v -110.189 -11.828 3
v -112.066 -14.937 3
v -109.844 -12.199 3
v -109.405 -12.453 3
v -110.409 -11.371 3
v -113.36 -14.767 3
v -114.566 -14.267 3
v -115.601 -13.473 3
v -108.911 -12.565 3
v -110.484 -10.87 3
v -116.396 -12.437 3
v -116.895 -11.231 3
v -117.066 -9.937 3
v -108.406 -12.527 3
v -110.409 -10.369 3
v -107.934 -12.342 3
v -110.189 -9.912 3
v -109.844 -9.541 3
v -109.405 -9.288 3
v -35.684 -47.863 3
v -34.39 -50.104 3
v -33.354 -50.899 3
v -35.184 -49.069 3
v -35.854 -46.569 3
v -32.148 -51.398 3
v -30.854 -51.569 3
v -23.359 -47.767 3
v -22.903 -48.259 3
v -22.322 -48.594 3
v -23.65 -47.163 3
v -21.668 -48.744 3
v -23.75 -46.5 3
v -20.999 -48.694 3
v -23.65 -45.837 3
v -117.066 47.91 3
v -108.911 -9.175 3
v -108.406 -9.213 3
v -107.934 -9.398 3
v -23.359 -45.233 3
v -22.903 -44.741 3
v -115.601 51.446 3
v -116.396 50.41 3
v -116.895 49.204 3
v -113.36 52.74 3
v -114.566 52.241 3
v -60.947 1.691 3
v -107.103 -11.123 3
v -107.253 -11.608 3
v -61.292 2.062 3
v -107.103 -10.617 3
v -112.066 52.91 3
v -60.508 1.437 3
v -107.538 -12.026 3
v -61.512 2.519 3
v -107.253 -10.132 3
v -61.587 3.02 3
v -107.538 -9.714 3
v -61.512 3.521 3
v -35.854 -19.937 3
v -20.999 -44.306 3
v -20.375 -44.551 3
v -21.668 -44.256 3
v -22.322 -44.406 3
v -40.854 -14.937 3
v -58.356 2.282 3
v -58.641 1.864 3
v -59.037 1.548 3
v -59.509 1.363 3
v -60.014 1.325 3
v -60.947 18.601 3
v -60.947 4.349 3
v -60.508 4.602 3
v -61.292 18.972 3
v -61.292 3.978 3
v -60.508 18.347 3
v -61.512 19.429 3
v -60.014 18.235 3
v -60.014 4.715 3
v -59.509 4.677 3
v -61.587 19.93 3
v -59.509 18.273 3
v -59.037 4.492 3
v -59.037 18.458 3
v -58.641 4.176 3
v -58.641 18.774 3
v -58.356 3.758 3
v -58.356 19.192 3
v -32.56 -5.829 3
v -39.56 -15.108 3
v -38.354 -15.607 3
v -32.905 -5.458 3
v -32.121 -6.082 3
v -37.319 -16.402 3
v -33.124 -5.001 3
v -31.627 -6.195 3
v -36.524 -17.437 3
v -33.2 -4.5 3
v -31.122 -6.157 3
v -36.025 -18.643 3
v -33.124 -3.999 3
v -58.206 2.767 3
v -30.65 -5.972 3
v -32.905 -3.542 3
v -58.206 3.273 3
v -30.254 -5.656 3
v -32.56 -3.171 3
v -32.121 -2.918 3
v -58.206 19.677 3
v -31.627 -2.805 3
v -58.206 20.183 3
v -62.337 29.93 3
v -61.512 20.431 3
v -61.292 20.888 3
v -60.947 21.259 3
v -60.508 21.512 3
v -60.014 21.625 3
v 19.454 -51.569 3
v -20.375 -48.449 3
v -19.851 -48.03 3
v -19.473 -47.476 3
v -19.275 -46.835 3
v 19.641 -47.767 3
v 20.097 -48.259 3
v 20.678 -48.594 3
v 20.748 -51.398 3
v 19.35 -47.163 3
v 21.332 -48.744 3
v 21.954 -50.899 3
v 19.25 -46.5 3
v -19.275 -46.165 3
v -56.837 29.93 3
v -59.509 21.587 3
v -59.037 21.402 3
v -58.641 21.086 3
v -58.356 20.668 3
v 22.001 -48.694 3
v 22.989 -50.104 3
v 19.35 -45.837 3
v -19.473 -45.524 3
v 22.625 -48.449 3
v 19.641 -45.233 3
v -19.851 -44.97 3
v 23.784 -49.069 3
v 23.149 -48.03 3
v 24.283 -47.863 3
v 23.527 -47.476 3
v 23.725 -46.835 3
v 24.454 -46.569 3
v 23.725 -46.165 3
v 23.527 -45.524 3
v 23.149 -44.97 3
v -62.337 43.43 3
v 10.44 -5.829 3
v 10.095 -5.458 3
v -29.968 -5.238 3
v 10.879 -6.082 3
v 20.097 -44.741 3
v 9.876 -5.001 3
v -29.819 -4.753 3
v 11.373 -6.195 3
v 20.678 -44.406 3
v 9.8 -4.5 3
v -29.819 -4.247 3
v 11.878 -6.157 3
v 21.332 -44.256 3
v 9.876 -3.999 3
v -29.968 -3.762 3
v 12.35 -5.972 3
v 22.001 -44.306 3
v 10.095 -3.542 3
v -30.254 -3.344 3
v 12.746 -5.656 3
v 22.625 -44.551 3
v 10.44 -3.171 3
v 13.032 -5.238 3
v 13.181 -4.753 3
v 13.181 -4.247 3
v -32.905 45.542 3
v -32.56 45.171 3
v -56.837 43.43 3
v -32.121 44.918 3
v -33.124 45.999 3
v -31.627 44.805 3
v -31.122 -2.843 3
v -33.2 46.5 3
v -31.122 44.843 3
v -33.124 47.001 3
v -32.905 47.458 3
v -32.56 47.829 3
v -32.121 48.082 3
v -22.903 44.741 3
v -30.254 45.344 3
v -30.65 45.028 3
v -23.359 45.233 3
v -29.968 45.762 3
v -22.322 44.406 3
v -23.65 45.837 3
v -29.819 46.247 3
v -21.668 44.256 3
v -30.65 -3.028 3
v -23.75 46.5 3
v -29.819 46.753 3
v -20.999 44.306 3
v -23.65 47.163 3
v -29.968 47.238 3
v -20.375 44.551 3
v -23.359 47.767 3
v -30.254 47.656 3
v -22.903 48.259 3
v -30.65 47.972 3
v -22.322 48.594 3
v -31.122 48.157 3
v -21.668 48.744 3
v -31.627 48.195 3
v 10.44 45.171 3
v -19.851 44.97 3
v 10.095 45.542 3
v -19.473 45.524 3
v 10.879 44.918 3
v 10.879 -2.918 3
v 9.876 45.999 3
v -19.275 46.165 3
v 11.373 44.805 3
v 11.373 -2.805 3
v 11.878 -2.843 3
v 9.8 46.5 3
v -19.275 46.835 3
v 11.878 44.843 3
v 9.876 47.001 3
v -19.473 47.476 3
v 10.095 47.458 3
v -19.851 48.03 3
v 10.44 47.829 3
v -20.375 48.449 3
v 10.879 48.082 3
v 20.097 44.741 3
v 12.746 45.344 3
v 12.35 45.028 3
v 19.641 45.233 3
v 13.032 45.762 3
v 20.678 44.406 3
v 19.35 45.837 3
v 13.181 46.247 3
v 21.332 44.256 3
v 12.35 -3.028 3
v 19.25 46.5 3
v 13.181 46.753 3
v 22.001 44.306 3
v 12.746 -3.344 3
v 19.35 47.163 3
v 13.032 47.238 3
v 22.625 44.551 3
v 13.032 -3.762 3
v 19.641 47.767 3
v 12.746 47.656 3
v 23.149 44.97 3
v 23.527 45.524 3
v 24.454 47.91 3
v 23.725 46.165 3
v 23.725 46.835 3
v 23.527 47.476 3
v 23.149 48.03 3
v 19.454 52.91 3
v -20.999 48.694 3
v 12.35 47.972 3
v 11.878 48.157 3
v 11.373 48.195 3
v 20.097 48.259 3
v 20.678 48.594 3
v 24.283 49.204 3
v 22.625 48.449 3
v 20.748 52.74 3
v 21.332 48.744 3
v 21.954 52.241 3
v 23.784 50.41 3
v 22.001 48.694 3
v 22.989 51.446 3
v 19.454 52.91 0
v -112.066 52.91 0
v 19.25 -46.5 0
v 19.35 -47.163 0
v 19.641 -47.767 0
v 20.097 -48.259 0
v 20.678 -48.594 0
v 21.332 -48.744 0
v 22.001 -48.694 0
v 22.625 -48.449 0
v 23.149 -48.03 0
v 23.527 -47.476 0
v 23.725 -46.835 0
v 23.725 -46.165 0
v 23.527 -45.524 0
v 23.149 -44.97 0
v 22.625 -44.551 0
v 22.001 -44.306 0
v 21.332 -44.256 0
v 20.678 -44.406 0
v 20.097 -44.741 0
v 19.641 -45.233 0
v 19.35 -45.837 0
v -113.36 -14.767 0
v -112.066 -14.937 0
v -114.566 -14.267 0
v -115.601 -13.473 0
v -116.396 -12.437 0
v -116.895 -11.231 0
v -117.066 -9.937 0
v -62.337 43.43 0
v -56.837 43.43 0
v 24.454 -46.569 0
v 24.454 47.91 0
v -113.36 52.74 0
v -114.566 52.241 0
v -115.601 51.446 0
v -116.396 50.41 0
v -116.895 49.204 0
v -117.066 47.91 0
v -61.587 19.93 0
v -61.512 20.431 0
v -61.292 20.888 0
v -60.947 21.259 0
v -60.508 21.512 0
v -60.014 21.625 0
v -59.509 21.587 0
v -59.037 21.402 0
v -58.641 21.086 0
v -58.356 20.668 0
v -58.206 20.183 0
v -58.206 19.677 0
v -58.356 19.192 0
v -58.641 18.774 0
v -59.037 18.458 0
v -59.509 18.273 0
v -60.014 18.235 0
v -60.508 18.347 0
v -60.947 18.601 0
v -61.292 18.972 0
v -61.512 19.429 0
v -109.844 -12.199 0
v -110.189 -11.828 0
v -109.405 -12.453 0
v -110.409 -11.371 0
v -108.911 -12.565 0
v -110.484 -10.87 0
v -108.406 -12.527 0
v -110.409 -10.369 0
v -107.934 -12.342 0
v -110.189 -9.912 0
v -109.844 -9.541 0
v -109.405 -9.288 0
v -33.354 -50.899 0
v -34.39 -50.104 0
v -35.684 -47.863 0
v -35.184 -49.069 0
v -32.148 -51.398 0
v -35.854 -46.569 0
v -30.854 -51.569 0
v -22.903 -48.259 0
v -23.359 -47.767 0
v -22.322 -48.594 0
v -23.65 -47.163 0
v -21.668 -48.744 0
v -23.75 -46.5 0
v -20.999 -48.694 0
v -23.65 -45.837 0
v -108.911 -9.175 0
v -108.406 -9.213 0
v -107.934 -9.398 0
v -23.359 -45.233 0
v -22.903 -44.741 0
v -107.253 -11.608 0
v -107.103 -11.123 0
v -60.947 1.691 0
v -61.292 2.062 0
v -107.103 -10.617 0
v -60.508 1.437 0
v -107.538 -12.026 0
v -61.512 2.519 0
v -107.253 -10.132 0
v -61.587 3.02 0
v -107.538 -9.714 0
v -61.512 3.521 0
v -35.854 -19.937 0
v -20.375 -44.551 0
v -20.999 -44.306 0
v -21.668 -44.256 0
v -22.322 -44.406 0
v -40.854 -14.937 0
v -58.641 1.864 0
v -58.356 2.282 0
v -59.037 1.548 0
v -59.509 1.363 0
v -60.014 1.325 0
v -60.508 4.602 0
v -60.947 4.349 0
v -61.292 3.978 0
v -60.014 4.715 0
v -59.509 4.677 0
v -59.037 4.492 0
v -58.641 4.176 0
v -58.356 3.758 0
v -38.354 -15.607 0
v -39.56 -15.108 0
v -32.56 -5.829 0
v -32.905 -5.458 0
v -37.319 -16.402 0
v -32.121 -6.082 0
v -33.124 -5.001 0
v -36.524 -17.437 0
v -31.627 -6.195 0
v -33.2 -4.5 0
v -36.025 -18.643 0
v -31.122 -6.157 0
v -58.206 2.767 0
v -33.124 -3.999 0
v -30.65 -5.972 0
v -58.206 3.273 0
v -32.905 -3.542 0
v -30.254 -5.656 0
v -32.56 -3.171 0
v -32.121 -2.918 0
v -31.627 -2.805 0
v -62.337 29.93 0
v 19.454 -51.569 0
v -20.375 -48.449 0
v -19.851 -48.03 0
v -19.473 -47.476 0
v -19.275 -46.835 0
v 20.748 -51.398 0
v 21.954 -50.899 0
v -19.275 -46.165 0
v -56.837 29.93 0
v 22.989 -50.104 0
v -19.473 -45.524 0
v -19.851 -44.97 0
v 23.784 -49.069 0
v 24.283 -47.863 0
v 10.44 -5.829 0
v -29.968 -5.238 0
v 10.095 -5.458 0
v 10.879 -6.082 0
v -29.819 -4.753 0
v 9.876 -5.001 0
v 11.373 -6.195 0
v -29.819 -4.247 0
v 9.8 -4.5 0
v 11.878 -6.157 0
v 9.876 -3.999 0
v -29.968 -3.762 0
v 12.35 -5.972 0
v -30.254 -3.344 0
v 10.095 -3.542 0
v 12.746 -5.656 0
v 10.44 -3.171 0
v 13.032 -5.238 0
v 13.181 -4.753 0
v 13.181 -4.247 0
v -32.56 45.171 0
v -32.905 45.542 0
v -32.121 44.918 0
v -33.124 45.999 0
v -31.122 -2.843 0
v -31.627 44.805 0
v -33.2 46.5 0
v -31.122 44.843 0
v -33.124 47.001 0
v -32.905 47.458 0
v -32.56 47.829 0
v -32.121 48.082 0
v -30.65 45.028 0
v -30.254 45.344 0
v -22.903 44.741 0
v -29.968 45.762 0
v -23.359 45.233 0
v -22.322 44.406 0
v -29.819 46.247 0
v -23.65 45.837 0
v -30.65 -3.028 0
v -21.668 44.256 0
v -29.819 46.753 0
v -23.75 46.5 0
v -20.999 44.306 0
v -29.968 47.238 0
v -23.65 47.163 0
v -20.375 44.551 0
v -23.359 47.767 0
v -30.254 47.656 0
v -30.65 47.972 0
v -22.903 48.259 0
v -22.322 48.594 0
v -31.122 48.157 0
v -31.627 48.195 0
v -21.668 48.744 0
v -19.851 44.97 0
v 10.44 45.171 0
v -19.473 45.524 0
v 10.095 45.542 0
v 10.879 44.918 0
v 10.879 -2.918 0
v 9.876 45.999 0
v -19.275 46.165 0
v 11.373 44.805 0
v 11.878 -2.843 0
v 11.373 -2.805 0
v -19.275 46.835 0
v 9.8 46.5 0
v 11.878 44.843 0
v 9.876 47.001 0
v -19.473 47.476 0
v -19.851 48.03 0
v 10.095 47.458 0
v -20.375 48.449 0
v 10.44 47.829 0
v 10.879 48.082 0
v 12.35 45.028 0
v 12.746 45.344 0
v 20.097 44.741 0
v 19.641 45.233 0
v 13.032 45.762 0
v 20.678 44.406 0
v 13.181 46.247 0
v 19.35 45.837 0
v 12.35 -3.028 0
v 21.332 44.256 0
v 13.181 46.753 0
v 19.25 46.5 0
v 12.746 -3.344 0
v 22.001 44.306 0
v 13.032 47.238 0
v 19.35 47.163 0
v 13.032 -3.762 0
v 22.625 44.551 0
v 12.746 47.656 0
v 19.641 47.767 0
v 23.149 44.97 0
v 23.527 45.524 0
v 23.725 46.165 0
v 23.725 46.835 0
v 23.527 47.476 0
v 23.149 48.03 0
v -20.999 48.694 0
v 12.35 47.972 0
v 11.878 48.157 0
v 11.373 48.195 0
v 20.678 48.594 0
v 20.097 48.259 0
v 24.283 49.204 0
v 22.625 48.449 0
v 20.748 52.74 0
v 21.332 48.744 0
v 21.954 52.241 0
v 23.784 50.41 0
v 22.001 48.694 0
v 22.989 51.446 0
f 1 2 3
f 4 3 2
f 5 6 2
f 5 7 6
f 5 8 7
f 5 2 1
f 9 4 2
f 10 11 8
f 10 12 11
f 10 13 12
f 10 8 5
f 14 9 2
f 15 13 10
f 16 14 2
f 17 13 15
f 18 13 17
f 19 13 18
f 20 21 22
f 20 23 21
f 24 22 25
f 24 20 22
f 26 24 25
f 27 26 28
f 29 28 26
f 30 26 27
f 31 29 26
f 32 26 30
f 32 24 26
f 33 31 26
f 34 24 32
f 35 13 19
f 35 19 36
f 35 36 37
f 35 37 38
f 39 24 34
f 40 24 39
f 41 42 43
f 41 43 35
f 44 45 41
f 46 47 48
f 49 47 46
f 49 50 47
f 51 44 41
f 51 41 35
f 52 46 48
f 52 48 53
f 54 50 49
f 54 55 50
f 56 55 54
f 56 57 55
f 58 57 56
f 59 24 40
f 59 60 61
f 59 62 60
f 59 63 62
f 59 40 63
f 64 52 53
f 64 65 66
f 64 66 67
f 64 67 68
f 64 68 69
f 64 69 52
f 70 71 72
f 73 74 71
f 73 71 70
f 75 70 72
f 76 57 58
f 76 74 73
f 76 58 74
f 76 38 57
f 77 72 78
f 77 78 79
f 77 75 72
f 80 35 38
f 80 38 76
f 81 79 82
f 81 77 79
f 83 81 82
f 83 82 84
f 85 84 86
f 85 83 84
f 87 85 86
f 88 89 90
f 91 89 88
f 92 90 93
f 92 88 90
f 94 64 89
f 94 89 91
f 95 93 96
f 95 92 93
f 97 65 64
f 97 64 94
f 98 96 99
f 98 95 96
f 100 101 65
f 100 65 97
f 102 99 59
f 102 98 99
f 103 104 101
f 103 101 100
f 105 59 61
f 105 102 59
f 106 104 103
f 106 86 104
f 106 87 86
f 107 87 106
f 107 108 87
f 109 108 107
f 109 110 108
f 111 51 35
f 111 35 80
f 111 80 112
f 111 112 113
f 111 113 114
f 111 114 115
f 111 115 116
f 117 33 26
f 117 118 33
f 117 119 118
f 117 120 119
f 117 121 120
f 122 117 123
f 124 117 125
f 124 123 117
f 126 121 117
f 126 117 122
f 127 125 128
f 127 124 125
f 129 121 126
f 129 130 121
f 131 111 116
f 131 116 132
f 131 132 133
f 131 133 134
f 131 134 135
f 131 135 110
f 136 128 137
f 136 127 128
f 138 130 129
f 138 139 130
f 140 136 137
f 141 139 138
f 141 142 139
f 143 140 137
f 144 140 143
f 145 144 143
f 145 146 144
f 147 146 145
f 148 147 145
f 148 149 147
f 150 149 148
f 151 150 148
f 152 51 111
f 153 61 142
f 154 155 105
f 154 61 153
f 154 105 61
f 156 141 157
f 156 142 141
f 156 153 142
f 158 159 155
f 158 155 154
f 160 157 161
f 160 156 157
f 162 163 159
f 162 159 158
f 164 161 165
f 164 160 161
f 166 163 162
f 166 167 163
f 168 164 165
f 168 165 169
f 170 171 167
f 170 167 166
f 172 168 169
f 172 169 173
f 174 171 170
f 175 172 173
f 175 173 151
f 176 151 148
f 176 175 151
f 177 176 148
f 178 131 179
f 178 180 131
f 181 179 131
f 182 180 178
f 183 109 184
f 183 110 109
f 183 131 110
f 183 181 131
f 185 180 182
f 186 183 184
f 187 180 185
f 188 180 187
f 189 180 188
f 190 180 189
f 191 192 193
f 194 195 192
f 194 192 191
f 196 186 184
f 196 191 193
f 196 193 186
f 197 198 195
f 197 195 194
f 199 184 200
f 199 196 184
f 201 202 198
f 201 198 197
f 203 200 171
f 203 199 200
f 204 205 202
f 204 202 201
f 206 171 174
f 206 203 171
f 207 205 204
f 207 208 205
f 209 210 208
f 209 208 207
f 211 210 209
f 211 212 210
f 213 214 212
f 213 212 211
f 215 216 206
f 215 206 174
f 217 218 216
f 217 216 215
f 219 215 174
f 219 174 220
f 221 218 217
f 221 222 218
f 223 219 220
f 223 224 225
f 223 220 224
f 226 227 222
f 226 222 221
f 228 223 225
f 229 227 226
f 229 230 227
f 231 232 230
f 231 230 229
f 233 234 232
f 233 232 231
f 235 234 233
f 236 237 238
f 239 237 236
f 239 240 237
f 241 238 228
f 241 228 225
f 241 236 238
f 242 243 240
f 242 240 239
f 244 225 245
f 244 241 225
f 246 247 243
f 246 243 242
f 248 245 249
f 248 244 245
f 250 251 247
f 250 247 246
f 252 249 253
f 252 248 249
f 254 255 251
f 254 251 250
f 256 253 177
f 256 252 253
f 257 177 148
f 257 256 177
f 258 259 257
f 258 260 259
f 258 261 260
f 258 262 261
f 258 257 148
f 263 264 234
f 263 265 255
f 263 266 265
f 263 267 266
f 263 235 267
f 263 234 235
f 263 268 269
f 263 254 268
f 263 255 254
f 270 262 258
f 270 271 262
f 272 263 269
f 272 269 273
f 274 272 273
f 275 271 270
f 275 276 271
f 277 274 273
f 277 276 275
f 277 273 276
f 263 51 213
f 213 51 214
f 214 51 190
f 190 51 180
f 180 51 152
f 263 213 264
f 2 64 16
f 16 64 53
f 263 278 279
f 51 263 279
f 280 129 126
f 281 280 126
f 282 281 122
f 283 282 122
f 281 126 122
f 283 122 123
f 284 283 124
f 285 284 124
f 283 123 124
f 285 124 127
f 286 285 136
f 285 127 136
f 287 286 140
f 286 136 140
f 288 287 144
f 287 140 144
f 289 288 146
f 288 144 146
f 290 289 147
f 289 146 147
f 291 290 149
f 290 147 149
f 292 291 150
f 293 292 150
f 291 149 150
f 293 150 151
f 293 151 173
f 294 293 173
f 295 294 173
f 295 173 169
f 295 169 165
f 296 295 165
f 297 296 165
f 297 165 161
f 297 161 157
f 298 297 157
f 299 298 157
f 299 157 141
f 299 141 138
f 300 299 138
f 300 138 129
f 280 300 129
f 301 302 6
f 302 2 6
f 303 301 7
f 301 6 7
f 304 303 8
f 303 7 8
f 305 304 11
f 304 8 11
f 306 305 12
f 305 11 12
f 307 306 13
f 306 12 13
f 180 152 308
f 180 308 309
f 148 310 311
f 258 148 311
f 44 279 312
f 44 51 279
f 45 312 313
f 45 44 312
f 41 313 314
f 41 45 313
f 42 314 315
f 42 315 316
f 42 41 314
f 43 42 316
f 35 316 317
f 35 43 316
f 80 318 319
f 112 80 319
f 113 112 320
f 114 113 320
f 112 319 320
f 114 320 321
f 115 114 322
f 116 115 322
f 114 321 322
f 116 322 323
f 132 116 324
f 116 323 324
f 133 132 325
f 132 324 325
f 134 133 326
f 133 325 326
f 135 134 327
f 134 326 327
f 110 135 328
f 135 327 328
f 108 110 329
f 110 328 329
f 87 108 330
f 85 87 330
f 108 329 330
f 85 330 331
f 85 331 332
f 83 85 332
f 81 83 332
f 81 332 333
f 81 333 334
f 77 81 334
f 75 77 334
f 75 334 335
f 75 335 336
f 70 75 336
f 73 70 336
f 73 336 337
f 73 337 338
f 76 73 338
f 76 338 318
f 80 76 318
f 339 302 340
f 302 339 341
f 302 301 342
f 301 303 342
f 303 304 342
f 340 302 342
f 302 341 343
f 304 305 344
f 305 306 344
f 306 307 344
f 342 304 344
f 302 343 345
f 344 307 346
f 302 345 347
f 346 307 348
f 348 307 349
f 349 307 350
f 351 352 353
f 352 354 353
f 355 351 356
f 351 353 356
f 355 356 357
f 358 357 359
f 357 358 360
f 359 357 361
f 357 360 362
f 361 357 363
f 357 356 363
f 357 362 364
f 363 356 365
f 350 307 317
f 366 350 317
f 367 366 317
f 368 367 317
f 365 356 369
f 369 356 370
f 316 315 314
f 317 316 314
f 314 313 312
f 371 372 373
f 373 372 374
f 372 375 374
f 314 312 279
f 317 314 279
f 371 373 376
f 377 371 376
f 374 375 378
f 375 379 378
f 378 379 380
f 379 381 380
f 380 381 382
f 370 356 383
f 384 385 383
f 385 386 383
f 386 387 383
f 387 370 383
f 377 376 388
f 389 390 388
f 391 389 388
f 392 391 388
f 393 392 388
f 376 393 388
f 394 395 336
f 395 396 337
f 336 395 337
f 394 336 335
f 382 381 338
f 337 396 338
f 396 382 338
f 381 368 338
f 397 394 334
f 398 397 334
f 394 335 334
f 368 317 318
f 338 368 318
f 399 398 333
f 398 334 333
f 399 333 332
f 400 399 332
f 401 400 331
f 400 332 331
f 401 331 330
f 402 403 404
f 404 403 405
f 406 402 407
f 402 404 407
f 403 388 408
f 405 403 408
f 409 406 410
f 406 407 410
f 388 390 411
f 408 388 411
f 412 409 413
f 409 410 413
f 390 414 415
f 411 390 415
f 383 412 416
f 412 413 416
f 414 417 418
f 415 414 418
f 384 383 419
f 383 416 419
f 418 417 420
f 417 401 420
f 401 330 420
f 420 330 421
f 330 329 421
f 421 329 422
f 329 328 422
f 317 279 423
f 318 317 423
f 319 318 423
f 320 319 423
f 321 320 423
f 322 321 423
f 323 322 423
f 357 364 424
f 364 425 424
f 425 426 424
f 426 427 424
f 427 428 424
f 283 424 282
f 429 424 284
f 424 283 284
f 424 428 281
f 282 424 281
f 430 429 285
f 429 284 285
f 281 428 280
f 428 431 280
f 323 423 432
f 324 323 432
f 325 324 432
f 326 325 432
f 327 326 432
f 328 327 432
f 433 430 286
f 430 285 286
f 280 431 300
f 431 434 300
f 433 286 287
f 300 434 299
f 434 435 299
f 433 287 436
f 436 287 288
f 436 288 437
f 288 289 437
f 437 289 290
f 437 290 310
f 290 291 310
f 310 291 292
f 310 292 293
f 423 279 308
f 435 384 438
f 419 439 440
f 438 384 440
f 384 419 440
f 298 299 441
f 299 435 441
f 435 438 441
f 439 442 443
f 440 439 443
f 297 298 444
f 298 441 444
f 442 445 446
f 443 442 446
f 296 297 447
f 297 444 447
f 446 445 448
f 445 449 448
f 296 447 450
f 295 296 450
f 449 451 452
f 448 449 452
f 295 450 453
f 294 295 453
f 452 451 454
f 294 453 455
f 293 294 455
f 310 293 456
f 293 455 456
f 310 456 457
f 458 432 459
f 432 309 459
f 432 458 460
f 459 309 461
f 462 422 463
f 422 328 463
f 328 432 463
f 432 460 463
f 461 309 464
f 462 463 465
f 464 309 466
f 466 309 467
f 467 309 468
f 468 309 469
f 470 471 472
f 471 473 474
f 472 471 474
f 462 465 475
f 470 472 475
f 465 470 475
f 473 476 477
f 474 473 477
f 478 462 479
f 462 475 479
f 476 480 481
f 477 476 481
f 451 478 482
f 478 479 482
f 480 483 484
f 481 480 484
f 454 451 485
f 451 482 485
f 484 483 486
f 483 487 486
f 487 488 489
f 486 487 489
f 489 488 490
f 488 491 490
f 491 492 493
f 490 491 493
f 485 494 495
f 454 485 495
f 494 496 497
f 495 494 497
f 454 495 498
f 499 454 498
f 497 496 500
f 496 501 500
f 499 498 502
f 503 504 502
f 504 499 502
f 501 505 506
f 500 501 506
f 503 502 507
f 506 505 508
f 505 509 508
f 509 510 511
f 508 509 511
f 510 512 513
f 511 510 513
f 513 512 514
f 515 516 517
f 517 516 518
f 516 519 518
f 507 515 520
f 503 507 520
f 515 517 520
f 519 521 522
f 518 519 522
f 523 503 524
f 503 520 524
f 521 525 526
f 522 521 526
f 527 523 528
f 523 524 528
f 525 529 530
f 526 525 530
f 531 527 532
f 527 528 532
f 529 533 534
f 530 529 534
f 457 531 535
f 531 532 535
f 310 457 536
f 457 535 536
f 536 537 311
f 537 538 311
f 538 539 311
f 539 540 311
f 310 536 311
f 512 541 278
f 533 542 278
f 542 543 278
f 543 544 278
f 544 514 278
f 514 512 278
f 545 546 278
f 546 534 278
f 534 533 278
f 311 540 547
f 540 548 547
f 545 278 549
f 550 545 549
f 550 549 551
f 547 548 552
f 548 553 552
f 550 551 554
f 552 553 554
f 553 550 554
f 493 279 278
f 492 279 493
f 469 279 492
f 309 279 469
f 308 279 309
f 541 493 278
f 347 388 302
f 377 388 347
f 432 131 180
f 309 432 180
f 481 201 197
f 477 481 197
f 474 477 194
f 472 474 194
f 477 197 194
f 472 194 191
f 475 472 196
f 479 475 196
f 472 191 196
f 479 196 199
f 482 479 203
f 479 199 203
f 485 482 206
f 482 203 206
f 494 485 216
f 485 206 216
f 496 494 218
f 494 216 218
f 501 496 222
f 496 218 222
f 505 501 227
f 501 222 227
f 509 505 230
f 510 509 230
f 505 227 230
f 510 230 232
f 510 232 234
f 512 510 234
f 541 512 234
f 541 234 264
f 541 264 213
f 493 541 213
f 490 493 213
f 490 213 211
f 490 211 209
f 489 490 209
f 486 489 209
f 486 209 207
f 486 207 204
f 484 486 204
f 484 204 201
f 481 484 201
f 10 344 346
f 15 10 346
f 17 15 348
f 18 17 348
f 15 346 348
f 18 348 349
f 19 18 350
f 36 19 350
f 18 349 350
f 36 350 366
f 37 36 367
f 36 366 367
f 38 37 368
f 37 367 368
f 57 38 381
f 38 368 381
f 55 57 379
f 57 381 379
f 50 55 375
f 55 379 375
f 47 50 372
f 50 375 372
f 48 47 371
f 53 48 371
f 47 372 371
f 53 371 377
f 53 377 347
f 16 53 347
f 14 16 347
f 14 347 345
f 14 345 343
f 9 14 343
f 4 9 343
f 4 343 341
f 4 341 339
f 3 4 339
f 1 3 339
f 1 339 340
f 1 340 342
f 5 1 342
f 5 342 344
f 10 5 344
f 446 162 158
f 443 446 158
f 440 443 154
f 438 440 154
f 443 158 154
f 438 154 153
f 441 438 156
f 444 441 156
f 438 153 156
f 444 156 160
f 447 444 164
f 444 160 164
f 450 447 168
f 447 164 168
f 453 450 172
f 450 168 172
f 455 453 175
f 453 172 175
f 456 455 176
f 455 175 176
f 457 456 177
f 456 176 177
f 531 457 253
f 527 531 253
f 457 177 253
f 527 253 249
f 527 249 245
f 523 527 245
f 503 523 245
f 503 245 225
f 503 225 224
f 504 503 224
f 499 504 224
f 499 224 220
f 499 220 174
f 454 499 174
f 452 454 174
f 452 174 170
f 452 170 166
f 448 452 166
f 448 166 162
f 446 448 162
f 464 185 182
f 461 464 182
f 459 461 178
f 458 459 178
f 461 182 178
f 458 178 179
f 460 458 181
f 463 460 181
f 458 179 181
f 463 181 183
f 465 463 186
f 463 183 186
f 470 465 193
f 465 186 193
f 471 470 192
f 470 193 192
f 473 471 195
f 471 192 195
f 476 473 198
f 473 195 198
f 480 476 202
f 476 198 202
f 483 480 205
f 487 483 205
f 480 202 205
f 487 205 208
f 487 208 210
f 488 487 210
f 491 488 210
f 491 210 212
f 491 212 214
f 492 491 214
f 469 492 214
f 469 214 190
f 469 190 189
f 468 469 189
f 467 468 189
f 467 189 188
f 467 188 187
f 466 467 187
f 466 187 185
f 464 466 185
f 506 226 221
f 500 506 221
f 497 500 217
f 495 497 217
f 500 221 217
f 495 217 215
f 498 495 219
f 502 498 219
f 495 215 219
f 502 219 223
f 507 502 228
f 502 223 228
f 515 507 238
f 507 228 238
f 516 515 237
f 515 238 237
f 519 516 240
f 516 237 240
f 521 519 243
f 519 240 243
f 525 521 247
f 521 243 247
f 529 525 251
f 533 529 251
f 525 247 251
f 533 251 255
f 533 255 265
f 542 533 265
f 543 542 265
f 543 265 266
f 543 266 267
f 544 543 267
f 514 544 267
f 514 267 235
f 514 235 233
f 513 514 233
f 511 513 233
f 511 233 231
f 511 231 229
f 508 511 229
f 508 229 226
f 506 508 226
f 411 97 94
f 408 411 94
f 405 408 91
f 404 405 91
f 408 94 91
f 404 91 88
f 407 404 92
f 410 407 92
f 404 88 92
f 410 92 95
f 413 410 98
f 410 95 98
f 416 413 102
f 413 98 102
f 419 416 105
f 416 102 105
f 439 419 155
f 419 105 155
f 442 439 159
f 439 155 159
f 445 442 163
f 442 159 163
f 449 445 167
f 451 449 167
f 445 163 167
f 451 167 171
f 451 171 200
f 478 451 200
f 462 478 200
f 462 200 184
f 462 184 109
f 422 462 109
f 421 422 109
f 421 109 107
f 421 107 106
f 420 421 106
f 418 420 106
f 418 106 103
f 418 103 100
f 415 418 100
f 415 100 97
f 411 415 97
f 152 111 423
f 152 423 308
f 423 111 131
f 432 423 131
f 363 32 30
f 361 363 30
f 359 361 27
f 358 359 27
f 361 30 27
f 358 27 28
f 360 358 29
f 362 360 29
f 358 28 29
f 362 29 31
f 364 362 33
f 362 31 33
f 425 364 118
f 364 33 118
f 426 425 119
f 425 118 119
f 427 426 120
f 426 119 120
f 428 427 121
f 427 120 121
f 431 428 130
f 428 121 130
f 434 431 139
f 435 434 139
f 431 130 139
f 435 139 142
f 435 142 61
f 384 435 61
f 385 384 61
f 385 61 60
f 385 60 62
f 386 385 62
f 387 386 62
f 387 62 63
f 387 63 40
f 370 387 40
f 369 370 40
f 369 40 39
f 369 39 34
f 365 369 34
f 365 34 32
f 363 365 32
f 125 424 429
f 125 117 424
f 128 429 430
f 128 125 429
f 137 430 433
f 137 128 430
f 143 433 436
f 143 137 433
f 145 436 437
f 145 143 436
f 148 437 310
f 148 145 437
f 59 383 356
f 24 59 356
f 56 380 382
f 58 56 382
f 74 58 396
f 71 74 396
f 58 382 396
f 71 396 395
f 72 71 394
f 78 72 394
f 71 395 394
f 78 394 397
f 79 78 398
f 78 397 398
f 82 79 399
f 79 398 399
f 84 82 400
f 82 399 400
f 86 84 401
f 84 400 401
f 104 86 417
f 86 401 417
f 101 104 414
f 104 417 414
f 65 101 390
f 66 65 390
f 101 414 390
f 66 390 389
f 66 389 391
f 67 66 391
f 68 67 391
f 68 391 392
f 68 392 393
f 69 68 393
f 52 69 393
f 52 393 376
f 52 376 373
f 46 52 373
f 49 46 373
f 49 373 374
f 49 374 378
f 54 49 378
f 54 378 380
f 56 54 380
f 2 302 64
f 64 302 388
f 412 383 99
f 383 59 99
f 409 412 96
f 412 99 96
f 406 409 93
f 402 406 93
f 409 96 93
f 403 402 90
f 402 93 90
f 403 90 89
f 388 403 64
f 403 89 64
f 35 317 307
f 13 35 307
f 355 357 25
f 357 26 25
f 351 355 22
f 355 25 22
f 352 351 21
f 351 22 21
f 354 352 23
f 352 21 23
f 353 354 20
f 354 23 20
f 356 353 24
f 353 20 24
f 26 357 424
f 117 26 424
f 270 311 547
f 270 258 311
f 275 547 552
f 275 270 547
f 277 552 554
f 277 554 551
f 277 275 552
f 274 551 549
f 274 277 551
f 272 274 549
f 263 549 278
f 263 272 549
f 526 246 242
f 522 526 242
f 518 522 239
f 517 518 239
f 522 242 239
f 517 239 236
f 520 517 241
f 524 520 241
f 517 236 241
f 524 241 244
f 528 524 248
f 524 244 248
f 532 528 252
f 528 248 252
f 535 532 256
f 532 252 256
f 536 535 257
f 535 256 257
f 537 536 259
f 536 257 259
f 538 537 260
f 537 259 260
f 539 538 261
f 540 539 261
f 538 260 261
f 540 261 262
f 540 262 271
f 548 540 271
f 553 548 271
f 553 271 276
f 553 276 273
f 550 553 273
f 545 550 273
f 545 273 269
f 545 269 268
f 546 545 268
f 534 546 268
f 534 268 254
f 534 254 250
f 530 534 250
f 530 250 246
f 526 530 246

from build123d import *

# Parameters (mm, degrees)
F1_DEPTH = 3
F2_D     = 4.5
F3_R     = 5
F4_D     = 3.4
F6_D     = 3.4
F5_W     = 5.5
F5_H     = 13.5
F7_DEPTH = 25


# Not quite as in the source:
# - a feature names something its author has since deleted; it is built from what else it names


with BuildPart() as f1:
    # F0 (on Top) → F1 (new body)
    with BuildSketch(Plane.XY):
        Polygon((-35.8541943133, -51.5685416758), (24.4538411498, -51.5685416758), (24.4538411498, 52.9103763402), (-117.0655786991, 52.9103763402), (-117.0655786991, -14.937300235), (-35.8541943133, -14.937300235), align=None)
    extrude(amount=F1_DEPTH)

    # F2 (through all)
    with Locations(Plane(origin=(0, 0, 0), x_dir=(1, 0, 0), z_dir=(0, 0, -1))):
        with Locations((-21.5, -46.5), (21.5, -46.5), (21.5, 46.5), (-21.5, 46.5)):
            Hole(F2_D / 2)

    # F3
    f3_edges = [f1.edges().sort_by_distance(p)[0] for p in [
        (-117.065579, 52.910376, 1.5),
        (24.453841, 52.910376, 1.5),
        (24.453841, -51.568542, 1.5),
        (-35.854194, -14.9373, 1.5),
        (-35.854194, -51.568542, 1.5),
        (-117.065579, -14.9373, 1.5),
    ]]
    fillet(f3_edges, radius=F3_R)

    # F4 (through all)
    with Locations(Plane(origin=(0, 0, 0), x_dir=(1, 0, 0), z_dir=(0, 0, -1))):
        with Locations((-31.5, -46.5), (11.5, -46.5), (11.5, 4.5), (-31.5, 4.5)):
            Hole(F4_D / 2)

    # F6 (through all)
    with Locations(Plane.XY.offset(3)):
        with Locations((-59.8872532725, 3.0199595654), (-59.8872532725, 19.9299595654), (-108.7842532725, -10.8700404346)):
            Hole(F6_D / 2)

    # F5 (on face) → F7 (cut)
    with BuildSketch(Plane.XY.offset(3)):
        with Locations((-59.5872532725, 36.6799595654)):
            Rectangle(F5_W, F5_H)
    extrude(amount=-F7_DEPTH, mode=Mode.SUBTRACT)


solid = f1.part
